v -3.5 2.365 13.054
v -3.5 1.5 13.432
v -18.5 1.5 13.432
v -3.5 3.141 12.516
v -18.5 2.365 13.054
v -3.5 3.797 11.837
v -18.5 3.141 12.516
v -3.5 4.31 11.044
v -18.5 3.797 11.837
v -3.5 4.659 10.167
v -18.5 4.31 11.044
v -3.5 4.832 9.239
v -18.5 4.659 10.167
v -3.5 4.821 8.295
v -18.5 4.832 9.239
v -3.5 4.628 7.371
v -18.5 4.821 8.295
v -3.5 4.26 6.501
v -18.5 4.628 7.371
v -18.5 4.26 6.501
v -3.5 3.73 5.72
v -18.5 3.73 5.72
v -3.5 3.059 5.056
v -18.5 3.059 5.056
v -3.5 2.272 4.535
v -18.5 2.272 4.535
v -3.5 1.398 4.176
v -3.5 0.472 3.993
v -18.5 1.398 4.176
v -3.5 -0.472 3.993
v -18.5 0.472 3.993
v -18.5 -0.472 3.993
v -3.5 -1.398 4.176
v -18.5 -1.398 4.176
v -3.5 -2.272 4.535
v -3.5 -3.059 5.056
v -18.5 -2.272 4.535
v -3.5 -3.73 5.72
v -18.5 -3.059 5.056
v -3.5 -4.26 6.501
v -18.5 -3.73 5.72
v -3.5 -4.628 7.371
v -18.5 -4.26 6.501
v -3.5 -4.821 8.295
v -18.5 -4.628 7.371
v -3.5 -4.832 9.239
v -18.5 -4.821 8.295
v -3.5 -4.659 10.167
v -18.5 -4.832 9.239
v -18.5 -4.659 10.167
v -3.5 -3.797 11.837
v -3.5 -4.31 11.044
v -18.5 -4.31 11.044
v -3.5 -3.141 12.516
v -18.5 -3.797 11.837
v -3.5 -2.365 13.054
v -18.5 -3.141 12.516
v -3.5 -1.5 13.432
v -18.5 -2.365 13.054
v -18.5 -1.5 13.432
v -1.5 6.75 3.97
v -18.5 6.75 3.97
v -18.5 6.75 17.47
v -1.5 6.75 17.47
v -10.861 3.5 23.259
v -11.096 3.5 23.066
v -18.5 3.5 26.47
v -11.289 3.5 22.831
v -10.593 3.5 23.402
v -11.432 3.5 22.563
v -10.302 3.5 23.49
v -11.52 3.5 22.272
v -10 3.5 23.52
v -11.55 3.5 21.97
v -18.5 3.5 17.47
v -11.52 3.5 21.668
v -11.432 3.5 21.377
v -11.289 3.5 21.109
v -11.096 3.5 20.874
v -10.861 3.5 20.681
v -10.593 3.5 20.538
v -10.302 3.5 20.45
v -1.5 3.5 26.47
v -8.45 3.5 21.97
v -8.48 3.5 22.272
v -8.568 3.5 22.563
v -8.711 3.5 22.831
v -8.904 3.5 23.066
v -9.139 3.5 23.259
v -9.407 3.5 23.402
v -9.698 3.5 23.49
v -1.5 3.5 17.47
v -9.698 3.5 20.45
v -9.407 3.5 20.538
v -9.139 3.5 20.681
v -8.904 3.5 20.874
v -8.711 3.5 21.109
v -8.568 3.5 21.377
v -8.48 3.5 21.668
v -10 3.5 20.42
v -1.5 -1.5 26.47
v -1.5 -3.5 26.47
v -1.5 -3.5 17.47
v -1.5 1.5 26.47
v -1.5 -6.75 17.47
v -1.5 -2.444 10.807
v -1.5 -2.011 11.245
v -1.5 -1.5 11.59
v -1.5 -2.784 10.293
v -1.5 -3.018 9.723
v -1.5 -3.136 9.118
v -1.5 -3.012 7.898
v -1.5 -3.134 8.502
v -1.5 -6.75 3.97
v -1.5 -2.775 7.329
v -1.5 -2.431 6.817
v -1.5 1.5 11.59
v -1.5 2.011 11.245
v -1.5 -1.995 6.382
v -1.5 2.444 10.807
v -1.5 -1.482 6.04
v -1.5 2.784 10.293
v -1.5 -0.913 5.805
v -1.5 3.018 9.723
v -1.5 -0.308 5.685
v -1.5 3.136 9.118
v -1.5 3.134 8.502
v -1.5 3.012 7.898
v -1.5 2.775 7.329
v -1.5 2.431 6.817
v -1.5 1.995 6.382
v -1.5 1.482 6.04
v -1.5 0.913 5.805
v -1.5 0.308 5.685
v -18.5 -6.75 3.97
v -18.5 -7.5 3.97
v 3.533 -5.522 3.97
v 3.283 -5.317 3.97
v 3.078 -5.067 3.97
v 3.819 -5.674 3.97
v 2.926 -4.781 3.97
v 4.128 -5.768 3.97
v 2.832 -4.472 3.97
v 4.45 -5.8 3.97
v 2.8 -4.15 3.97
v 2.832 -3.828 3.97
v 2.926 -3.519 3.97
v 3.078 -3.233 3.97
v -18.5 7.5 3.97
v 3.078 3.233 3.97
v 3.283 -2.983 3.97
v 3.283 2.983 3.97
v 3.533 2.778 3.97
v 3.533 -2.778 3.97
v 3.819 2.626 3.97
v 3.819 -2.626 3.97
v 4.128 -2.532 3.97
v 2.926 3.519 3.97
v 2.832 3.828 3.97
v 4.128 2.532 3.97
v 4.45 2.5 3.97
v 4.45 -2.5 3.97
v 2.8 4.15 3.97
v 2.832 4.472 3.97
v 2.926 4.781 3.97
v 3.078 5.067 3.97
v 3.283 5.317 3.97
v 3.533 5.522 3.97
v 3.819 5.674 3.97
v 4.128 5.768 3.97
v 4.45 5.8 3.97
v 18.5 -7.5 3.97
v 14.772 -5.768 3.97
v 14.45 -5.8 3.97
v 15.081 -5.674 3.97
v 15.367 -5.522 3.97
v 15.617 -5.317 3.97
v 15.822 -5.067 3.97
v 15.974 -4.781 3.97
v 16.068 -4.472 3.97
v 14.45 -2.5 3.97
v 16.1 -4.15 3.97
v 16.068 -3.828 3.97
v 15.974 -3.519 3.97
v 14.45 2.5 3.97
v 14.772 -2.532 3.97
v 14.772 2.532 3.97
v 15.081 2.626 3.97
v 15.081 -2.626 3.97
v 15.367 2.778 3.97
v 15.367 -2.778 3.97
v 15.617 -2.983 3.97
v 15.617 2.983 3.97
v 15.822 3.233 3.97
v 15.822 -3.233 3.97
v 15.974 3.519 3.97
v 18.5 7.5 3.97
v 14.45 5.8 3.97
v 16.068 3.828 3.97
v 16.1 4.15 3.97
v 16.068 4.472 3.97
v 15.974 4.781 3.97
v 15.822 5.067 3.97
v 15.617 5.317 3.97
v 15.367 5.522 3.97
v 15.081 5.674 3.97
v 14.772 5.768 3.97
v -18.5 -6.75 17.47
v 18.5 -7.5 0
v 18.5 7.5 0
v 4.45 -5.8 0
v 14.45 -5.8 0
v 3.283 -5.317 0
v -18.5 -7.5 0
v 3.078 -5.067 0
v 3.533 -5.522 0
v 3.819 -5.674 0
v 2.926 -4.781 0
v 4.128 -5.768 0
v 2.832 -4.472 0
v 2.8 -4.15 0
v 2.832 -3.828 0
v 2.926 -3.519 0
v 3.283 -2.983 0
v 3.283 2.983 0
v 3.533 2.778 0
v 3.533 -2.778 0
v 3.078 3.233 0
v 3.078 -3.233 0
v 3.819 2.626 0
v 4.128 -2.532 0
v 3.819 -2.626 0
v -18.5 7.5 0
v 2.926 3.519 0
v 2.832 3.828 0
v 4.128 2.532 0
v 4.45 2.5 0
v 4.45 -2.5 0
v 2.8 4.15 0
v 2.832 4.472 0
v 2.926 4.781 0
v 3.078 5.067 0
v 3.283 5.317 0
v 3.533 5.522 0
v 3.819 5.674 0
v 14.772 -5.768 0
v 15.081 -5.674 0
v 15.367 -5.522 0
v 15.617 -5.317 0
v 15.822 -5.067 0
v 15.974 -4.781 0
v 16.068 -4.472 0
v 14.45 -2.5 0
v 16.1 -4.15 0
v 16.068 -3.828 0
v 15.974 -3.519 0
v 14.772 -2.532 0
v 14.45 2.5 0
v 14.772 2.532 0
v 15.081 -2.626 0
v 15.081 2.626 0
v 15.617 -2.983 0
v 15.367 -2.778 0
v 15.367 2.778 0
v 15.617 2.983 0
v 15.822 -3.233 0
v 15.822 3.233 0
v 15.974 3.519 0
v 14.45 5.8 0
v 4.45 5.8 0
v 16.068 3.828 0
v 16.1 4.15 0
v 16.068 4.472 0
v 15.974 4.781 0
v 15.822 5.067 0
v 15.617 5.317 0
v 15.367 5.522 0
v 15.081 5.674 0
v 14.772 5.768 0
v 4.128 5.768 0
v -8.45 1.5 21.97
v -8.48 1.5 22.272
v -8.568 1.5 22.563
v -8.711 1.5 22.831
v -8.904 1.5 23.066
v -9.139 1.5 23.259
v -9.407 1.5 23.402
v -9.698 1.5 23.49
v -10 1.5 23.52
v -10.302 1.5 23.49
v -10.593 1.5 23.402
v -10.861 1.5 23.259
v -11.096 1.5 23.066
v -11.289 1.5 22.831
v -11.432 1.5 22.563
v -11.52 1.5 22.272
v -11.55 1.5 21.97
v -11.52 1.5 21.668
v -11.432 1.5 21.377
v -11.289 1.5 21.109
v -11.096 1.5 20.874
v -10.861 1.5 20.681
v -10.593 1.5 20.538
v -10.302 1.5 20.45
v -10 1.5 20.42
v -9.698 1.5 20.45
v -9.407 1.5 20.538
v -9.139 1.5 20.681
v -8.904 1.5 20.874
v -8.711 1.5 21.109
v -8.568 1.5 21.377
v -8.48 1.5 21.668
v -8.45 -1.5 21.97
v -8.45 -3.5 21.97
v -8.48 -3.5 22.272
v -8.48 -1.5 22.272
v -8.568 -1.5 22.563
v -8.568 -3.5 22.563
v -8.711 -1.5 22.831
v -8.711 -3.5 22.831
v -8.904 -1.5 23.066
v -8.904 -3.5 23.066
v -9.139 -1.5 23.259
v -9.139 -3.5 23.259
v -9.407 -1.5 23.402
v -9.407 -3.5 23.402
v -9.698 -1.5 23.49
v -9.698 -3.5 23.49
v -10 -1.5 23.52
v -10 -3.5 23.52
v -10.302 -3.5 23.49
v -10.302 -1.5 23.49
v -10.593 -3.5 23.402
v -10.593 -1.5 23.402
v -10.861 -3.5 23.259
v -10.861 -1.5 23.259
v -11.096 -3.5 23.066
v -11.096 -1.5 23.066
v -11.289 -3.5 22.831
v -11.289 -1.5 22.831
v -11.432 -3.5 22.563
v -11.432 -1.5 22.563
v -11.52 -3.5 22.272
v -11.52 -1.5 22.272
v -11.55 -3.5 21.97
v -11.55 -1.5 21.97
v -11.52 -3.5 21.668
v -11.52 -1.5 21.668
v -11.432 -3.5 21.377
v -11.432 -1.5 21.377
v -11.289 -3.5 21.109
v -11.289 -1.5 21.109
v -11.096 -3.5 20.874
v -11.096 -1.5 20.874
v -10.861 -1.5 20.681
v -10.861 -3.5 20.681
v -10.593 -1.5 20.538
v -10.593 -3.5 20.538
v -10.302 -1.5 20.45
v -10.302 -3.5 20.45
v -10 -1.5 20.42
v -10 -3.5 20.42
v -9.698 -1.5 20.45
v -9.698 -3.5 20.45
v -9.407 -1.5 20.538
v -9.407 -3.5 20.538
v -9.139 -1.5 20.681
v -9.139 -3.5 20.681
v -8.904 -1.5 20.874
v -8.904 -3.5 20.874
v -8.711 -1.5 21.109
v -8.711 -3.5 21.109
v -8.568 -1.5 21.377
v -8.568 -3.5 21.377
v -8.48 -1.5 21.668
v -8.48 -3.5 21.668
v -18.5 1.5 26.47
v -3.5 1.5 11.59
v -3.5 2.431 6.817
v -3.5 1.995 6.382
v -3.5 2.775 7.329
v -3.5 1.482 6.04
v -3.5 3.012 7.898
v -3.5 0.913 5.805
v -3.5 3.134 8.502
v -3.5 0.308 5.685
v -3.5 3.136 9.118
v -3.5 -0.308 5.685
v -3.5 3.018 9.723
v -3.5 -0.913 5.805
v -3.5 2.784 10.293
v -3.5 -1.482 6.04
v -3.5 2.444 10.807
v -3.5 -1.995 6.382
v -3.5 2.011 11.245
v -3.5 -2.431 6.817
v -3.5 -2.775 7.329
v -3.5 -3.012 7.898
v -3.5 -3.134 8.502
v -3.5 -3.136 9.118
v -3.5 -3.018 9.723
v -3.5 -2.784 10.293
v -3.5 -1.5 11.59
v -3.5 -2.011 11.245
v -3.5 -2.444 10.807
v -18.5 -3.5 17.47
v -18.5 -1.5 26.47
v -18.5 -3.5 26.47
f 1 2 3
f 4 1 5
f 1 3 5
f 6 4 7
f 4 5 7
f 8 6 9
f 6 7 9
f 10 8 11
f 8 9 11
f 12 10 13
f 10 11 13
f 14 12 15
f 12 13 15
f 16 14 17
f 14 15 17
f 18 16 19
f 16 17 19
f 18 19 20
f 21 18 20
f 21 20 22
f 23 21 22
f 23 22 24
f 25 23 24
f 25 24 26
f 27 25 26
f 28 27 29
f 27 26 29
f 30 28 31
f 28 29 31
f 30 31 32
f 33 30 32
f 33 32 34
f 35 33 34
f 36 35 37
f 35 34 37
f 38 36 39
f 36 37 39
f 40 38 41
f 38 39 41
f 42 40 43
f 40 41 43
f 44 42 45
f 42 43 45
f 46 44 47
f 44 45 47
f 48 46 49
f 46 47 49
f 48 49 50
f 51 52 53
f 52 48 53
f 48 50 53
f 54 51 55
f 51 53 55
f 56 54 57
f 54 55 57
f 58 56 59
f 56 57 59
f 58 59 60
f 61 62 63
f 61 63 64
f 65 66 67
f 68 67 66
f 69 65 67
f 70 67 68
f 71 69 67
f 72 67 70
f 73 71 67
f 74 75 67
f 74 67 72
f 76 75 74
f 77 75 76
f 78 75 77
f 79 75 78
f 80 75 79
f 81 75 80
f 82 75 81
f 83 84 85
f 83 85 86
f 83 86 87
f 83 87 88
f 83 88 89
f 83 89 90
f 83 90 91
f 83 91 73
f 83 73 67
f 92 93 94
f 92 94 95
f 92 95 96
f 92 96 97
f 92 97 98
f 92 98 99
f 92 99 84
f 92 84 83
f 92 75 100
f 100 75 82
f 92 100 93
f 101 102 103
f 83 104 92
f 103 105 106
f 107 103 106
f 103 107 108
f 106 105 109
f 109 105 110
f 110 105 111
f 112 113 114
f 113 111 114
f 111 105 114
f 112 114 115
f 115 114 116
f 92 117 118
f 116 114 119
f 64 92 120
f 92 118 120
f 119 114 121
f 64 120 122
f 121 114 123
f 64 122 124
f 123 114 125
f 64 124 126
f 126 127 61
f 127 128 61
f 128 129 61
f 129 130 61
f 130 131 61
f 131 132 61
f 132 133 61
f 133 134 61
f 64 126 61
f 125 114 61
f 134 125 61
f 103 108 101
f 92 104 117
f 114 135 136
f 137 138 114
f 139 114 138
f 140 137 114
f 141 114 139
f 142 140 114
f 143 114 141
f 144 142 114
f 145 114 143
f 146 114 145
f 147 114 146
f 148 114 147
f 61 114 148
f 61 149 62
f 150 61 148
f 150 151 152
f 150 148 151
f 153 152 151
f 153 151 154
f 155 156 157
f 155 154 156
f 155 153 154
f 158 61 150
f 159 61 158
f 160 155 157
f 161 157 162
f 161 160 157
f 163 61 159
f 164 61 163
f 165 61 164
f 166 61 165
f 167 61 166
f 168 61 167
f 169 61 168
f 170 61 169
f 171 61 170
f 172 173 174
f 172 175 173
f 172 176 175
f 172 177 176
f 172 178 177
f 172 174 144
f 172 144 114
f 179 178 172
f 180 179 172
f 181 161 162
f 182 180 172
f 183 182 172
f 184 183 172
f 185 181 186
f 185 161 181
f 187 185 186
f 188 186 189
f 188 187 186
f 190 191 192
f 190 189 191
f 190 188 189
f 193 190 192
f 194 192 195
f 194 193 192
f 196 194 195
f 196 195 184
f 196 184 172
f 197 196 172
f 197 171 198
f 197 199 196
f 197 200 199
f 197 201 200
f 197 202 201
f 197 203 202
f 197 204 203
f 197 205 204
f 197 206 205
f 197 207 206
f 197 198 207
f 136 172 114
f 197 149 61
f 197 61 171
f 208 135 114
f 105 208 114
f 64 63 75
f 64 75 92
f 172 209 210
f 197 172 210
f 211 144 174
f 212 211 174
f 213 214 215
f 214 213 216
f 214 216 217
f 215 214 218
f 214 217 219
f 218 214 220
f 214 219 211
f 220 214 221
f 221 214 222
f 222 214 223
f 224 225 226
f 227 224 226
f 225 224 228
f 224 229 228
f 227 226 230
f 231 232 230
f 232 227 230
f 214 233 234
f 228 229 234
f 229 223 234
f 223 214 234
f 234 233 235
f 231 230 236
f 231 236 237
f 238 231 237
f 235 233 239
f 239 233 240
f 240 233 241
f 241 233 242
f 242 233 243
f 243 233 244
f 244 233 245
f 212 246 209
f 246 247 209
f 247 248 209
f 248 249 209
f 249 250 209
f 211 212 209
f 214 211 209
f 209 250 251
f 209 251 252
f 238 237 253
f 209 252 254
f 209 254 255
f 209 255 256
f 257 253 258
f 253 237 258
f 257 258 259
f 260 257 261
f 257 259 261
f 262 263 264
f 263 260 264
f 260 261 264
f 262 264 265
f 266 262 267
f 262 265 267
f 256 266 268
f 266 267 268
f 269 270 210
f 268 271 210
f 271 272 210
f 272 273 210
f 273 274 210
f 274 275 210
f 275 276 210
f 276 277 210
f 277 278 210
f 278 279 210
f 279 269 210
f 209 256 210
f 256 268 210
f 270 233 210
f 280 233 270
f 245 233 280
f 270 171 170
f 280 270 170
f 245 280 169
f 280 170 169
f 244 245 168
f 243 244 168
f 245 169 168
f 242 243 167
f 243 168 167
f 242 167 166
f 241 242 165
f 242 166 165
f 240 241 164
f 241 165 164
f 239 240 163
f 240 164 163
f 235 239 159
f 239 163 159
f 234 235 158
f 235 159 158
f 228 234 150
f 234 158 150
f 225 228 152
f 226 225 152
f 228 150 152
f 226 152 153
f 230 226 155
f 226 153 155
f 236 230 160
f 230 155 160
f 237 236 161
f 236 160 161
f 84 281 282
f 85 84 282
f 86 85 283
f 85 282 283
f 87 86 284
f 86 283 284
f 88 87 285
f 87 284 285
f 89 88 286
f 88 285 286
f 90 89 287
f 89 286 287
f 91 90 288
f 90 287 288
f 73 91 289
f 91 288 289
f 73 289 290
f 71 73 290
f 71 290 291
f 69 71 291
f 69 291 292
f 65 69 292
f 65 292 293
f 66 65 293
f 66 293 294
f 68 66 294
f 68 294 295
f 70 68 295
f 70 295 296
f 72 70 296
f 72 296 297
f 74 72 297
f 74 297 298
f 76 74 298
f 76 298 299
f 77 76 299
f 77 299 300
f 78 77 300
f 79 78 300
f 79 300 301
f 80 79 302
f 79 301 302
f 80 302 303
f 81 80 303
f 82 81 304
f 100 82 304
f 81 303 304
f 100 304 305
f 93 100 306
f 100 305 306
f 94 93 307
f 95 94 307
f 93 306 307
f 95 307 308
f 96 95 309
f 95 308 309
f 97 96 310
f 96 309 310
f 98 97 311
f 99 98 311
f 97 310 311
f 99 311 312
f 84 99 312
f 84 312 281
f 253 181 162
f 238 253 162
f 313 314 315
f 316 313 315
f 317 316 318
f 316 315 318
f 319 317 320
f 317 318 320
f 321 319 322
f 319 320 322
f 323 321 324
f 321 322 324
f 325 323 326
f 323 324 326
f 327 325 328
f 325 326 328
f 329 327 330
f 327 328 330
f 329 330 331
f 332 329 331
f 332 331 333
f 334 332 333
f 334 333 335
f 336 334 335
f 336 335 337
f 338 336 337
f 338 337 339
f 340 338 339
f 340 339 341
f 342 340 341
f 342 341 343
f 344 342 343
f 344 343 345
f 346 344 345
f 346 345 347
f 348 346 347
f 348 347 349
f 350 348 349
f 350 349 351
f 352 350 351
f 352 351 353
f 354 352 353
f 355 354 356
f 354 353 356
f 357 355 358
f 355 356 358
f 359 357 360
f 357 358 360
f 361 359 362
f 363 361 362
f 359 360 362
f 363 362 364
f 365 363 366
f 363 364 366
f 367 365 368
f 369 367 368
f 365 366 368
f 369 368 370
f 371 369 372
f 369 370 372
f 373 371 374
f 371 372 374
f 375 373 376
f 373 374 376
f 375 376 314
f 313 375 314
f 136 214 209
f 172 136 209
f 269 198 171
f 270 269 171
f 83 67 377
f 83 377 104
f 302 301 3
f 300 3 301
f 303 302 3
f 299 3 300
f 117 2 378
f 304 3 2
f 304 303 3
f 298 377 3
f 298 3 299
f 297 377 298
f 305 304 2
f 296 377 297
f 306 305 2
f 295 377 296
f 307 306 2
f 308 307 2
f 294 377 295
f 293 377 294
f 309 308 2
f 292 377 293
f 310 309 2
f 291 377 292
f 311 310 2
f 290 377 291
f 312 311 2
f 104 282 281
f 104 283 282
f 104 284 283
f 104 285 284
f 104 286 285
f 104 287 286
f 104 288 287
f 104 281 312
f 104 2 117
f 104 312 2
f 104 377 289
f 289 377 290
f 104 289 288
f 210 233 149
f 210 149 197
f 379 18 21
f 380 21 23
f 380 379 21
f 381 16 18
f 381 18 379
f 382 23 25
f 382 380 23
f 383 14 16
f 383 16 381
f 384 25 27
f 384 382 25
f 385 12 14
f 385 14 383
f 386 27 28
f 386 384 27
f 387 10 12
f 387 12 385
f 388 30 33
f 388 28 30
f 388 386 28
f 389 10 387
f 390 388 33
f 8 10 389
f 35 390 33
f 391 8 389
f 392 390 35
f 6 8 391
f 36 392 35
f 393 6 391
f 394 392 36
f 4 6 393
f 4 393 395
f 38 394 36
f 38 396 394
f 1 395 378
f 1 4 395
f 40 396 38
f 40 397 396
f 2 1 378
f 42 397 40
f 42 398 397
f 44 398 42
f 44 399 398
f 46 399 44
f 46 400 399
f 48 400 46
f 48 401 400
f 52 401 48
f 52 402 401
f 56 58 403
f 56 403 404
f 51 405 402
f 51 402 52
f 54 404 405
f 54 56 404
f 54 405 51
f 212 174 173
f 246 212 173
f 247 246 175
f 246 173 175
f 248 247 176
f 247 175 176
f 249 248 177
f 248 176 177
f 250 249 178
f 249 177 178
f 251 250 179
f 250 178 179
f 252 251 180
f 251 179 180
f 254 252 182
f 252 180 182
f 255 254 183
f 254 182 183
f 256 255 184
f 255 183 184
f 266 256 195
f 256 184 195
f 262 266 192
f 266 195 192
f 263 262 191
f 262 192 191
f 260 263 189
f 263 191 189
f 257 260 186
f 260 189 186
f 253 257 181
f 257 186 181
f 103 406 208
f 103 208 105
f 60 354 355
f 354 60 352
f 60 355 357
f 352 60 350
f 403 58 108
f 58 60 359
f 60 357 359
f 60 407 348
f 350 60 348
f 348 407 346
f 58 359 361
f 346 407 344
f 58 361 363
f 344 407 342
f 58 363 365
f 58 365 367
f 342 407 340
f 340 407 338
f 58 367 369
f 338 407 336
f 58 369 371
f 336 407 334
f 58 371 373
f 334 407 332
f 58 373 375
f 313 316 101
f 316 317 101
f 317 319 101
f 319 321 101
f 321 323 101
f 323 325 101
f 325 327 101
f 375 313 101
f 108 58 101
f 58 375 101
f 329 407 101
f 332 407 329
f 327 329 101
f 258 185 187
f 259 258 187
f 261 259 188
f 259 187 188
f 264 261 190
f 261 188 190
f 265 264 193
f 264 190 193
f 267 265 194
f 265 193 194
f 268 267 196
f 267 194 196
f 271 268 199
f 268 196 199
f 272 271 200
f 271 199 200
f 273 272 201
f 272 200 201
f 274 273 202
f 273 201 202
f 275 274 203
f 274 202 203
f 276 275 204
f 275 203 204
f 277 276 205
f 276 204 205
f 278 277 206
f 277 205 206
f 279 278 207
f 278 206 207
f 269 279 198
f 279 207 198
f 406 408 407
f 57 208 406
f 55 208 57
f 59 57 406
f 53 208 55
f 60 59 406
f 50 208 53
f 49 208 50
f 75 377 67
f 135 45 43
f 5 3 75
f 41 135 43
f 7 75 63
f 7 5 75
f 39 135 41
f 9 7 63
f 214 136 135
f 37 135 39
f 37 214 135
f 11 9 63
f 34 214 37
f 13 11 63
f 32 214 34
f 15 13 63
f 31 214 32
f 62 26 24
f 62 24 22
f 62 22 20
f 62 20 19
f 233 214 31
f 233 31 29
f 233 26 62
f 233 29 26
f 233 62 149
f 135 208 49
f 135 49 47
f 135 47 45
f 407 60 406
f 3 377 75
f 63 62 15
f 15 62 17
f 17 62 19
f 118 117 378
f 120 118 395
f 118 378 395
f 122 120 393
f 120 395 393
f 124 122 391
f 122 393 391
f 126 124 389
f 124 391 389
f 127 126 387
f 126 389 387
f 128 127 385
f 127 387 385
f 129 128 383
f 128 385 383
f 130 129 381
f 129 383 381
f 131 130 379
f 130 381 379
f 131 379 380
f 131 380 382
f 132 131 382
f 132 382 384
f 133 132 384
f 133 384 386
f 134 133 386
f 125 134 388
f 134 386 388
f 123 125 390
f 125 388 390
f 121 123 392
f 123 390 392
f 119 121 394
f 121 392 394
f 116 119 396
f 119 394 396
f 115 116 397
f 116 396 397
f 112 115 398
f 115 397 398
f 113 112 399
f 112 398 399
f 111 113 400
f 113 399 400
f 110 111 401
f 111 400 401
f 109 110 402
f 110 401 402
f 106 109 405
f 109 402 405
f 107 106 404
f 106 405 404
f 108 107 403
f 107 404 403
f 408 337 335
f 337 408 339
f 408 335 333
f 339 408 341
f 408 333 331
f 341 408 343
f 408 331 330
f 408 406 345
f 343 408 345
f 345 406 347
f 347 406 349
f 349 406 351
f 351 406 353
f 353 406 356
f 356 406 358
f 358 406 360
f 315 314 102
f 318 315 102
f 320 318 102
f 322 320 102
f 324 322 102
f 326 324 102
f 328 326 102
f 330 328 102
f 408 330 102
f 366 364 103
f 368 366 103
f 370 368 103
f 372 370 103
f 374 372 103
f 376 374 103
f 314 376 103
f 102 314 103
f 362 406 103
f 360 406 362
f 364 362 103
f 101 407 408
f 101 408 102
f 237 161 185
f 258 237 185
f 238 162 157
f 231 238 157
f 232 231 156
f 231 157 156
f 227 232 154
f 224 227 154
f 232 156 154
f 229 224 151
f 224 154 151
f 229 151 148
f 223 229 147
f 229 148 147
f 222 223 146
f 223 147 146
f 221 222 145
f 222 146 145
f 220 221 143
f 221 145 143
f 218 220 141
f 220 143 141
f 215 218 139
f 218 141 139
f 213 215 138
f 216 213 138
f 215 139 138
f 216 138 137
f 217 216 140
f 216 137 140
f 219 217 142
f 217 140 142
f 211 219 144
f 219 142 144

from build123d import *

# Parameters (mm, degrees)
F0_W      = 37
F0_H      = 15
F1_DEPTH  = 3.97
F2_W      = 17
F2_H      = 13.5
F3_DEPTH  = 13.5
F4_R      = 4.85
F5_DEPTH  = 15
F6_R      = 3.15
F7_DEPTH  = 22.001
F8_W      = 17
F8_H      = 7
F9_DEPTH  = 9
F10_R     = 1.55
F11_DEPTH = 11.001
F12_W     = 17
F12_H     = 3
F13_DEPTH = 17.5
F15_DEPTH = 3.971


with BuildPart() as f1:
    # F0 (on Top) → F1 (new body)
    with BuildSketch(Plane.XY):
        Rectangle(F0_W, F0_H)
    extrude(amount=F1_DEPTH)

    # F2 (on face) → F3 (join)
    with BuildSketch(Plane.XY.offset(3.97)):
        with Locations((-10, 0)):
            Rectangle(F2_W, F2_H)
    extrude(amount=F3_DEPTH)

    # F4 (on face) → F5 (cut)
    with BuildSketch(Plane(origin=(-18.5, 0, 0), x_dir=(0, -1, 0), z_dir=(-1, 0, 0))):
        with Locations((0, 8.82)):
            Circle(F4_R)
    extrude(amount=-F5_DEPTH, mode=Mode.SUBTRACT)

    # F6 (on face) → F7 (cut, through all)
    with BuildSketch(Plane(origin=(-3.5, 0, 0), x_dir=(0, -1, 0), z_dir=(-1, 0, 0))):
        with Locations((0, 8.82)):
            Circle(F6_R)
    extrude(amount=-F7_DEPTH, mode=Mode.SUBTRACT)

    # F8 (on face) → F9 (join)
    with BuildSketch(Plane.XY.offset(17.47)):
        with Locations((-10, 0)):
            Rectangle(F8_W, F8_H)
    extrude(amount=F9_DEPTH)

    # F10 (on face) → F11 (cut, through all)
    with BuildSketch(Plane.XZ.offset(3.5)):
        with Locations((-10, 21.97)):
            Circle(F10_R)
    extrude(amount=-F11_DEPTH, mode=Mode.SUBTRACT)

    # F12 (on face) → F13 (cut)
    with BuildSketch(Plane.XY.offset(26.47)):
        with Locations((-10, 0)):
            Rectangle(F12_W, F12_H)
    extrude(amount=-F13_DEPTH, mode=Mode.SUBTRACT)

    # F14 (on face) → F15 (cut, through all)
    with BuildSketch(Plane.XY.offset(3.97)):
        with BuildLine():
            Line((14.45, 5.8), (4.45, 5.8))
            ThreePointArc((4.45, 5.8), (2.8, 4.15), (4.45, 2.5))
            Line((4.45, 2.5), (14.45, 2.5))
            ThreePointArc((14.45, 2.5), (16.1, 4.15), (14.45, 5.8))
        make_face()
        with BuildLine():
            Line((14.45, -2.5), (4.45, -2.5))
            ThreePointArc((4.45, -2.5), (2.8, -4.15), (4.45, -5.8))
            Line((4.45, -5.8), (14.45, -5.8))
            ThreePointArc((14.45, -5.8), (16.1, -4.15), (14.45, -2.5))
        make_face()
    extrude(amount=-F15_DEPTH, mode=Mode.SUBTRACT)


solid = f1.part
